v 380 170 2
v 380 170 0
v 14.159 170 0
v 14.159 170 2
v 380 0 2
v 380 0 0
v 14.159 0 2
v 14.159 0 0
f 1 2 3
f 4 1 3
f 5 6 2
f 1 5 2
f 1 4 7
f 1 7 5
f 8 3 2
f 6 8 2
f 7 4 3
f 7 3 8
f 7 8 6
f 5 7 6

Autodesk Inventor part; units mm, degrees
ref_plane "YZ Plane" through (0, 0, 0) normal (1, 0, 0) x (0, 1, 0)
ref_plane "XZ Plane" through (0, 0, 0) normal (0, 1, 0) x (-1, 0, 0)
ref_plane "XY Plane" through (0, 0, 0) normal (0, 0, 1) x (1, 0, 0)
sketch "Эскиз1" plane through (0, 0, 0) normal (0, 0, 1) x (1, 0, 0)
  line L0 (0, 0) -> (380, 0)
  line L1 (380, 0) -> (380, 227)
  line L2 (380, 227) -> (0, 227)
  line L3 (0, 227) -> (0, 0)
  dimension "d0" = 380
  dimension "d1" = 227
extrude "Выдавливание1" add sketch "Эскиз1" along normal blind 2
sketch "Эскиз2" plane through (0, 0, 2) normal (0, 0, 1) x (1, 0, 0)
  arc A0 (24, 227) -> (184.1593, 0) centre (184.1593, 170) ccw projected
  line L0 (380, 0) -> (380, 227) projected
  line L1 (380, 227) -> (0, 227) projected
  line L2 (0, 227) -> (0, 0) projected
  line L3 (0, 0) -> (380, 0) projected
  line L4 (14.1593, 232.9564) -> (14.1593, -21.9054)
  line L5 (0, 227) -> (0, 0) projected
  point P0 (14.1593, 170)
  point P1 (24, 227)
  point P2 (14.1593, 0)
extrude "Выдавливание2" cut sketch "Эскиз2" against normal blind 10 contours A0 L4 L1 | L4 L3 L2 L1
sketch "Эскиз3" plane through (0, 0, 0) normal (0, 0, -1) x (-1, 0, 0)
  circle A0 centre (-199.1637, 155) radius 3.1 projected
  line L0 (-199.1637, 155) -> (-199.1637, 170)
  line L1 (-199.1637, 170) -> (-433.1861, 170)
  line L2 (-14.1593, 0) -> (-14.1593, 170) projected
  arc A1 (-14.1593, 170) -> (-24, 227) centre (-184.1593, 170) ccw projected
  line L3 (-380, 227) -> (-24, 227) projected
  line L4 (-380, 0) -> (-380, 227) projected
  line L5 (-14.1593, 0) -> (-380, 0) projected
  line L6 (-199.1637, 170) -> (39.472, 170)
  point P0 (0, 0)
  point P1 (-380, 170)
  point P2 (-14.1593, 170)
  dimension "d6" = 15
extrude "Выдавливание3" cut sketch "Эскиз3" against normal blind 10 contours L1 L4 L3 A1 L6
properties part number "стенка ответная"
